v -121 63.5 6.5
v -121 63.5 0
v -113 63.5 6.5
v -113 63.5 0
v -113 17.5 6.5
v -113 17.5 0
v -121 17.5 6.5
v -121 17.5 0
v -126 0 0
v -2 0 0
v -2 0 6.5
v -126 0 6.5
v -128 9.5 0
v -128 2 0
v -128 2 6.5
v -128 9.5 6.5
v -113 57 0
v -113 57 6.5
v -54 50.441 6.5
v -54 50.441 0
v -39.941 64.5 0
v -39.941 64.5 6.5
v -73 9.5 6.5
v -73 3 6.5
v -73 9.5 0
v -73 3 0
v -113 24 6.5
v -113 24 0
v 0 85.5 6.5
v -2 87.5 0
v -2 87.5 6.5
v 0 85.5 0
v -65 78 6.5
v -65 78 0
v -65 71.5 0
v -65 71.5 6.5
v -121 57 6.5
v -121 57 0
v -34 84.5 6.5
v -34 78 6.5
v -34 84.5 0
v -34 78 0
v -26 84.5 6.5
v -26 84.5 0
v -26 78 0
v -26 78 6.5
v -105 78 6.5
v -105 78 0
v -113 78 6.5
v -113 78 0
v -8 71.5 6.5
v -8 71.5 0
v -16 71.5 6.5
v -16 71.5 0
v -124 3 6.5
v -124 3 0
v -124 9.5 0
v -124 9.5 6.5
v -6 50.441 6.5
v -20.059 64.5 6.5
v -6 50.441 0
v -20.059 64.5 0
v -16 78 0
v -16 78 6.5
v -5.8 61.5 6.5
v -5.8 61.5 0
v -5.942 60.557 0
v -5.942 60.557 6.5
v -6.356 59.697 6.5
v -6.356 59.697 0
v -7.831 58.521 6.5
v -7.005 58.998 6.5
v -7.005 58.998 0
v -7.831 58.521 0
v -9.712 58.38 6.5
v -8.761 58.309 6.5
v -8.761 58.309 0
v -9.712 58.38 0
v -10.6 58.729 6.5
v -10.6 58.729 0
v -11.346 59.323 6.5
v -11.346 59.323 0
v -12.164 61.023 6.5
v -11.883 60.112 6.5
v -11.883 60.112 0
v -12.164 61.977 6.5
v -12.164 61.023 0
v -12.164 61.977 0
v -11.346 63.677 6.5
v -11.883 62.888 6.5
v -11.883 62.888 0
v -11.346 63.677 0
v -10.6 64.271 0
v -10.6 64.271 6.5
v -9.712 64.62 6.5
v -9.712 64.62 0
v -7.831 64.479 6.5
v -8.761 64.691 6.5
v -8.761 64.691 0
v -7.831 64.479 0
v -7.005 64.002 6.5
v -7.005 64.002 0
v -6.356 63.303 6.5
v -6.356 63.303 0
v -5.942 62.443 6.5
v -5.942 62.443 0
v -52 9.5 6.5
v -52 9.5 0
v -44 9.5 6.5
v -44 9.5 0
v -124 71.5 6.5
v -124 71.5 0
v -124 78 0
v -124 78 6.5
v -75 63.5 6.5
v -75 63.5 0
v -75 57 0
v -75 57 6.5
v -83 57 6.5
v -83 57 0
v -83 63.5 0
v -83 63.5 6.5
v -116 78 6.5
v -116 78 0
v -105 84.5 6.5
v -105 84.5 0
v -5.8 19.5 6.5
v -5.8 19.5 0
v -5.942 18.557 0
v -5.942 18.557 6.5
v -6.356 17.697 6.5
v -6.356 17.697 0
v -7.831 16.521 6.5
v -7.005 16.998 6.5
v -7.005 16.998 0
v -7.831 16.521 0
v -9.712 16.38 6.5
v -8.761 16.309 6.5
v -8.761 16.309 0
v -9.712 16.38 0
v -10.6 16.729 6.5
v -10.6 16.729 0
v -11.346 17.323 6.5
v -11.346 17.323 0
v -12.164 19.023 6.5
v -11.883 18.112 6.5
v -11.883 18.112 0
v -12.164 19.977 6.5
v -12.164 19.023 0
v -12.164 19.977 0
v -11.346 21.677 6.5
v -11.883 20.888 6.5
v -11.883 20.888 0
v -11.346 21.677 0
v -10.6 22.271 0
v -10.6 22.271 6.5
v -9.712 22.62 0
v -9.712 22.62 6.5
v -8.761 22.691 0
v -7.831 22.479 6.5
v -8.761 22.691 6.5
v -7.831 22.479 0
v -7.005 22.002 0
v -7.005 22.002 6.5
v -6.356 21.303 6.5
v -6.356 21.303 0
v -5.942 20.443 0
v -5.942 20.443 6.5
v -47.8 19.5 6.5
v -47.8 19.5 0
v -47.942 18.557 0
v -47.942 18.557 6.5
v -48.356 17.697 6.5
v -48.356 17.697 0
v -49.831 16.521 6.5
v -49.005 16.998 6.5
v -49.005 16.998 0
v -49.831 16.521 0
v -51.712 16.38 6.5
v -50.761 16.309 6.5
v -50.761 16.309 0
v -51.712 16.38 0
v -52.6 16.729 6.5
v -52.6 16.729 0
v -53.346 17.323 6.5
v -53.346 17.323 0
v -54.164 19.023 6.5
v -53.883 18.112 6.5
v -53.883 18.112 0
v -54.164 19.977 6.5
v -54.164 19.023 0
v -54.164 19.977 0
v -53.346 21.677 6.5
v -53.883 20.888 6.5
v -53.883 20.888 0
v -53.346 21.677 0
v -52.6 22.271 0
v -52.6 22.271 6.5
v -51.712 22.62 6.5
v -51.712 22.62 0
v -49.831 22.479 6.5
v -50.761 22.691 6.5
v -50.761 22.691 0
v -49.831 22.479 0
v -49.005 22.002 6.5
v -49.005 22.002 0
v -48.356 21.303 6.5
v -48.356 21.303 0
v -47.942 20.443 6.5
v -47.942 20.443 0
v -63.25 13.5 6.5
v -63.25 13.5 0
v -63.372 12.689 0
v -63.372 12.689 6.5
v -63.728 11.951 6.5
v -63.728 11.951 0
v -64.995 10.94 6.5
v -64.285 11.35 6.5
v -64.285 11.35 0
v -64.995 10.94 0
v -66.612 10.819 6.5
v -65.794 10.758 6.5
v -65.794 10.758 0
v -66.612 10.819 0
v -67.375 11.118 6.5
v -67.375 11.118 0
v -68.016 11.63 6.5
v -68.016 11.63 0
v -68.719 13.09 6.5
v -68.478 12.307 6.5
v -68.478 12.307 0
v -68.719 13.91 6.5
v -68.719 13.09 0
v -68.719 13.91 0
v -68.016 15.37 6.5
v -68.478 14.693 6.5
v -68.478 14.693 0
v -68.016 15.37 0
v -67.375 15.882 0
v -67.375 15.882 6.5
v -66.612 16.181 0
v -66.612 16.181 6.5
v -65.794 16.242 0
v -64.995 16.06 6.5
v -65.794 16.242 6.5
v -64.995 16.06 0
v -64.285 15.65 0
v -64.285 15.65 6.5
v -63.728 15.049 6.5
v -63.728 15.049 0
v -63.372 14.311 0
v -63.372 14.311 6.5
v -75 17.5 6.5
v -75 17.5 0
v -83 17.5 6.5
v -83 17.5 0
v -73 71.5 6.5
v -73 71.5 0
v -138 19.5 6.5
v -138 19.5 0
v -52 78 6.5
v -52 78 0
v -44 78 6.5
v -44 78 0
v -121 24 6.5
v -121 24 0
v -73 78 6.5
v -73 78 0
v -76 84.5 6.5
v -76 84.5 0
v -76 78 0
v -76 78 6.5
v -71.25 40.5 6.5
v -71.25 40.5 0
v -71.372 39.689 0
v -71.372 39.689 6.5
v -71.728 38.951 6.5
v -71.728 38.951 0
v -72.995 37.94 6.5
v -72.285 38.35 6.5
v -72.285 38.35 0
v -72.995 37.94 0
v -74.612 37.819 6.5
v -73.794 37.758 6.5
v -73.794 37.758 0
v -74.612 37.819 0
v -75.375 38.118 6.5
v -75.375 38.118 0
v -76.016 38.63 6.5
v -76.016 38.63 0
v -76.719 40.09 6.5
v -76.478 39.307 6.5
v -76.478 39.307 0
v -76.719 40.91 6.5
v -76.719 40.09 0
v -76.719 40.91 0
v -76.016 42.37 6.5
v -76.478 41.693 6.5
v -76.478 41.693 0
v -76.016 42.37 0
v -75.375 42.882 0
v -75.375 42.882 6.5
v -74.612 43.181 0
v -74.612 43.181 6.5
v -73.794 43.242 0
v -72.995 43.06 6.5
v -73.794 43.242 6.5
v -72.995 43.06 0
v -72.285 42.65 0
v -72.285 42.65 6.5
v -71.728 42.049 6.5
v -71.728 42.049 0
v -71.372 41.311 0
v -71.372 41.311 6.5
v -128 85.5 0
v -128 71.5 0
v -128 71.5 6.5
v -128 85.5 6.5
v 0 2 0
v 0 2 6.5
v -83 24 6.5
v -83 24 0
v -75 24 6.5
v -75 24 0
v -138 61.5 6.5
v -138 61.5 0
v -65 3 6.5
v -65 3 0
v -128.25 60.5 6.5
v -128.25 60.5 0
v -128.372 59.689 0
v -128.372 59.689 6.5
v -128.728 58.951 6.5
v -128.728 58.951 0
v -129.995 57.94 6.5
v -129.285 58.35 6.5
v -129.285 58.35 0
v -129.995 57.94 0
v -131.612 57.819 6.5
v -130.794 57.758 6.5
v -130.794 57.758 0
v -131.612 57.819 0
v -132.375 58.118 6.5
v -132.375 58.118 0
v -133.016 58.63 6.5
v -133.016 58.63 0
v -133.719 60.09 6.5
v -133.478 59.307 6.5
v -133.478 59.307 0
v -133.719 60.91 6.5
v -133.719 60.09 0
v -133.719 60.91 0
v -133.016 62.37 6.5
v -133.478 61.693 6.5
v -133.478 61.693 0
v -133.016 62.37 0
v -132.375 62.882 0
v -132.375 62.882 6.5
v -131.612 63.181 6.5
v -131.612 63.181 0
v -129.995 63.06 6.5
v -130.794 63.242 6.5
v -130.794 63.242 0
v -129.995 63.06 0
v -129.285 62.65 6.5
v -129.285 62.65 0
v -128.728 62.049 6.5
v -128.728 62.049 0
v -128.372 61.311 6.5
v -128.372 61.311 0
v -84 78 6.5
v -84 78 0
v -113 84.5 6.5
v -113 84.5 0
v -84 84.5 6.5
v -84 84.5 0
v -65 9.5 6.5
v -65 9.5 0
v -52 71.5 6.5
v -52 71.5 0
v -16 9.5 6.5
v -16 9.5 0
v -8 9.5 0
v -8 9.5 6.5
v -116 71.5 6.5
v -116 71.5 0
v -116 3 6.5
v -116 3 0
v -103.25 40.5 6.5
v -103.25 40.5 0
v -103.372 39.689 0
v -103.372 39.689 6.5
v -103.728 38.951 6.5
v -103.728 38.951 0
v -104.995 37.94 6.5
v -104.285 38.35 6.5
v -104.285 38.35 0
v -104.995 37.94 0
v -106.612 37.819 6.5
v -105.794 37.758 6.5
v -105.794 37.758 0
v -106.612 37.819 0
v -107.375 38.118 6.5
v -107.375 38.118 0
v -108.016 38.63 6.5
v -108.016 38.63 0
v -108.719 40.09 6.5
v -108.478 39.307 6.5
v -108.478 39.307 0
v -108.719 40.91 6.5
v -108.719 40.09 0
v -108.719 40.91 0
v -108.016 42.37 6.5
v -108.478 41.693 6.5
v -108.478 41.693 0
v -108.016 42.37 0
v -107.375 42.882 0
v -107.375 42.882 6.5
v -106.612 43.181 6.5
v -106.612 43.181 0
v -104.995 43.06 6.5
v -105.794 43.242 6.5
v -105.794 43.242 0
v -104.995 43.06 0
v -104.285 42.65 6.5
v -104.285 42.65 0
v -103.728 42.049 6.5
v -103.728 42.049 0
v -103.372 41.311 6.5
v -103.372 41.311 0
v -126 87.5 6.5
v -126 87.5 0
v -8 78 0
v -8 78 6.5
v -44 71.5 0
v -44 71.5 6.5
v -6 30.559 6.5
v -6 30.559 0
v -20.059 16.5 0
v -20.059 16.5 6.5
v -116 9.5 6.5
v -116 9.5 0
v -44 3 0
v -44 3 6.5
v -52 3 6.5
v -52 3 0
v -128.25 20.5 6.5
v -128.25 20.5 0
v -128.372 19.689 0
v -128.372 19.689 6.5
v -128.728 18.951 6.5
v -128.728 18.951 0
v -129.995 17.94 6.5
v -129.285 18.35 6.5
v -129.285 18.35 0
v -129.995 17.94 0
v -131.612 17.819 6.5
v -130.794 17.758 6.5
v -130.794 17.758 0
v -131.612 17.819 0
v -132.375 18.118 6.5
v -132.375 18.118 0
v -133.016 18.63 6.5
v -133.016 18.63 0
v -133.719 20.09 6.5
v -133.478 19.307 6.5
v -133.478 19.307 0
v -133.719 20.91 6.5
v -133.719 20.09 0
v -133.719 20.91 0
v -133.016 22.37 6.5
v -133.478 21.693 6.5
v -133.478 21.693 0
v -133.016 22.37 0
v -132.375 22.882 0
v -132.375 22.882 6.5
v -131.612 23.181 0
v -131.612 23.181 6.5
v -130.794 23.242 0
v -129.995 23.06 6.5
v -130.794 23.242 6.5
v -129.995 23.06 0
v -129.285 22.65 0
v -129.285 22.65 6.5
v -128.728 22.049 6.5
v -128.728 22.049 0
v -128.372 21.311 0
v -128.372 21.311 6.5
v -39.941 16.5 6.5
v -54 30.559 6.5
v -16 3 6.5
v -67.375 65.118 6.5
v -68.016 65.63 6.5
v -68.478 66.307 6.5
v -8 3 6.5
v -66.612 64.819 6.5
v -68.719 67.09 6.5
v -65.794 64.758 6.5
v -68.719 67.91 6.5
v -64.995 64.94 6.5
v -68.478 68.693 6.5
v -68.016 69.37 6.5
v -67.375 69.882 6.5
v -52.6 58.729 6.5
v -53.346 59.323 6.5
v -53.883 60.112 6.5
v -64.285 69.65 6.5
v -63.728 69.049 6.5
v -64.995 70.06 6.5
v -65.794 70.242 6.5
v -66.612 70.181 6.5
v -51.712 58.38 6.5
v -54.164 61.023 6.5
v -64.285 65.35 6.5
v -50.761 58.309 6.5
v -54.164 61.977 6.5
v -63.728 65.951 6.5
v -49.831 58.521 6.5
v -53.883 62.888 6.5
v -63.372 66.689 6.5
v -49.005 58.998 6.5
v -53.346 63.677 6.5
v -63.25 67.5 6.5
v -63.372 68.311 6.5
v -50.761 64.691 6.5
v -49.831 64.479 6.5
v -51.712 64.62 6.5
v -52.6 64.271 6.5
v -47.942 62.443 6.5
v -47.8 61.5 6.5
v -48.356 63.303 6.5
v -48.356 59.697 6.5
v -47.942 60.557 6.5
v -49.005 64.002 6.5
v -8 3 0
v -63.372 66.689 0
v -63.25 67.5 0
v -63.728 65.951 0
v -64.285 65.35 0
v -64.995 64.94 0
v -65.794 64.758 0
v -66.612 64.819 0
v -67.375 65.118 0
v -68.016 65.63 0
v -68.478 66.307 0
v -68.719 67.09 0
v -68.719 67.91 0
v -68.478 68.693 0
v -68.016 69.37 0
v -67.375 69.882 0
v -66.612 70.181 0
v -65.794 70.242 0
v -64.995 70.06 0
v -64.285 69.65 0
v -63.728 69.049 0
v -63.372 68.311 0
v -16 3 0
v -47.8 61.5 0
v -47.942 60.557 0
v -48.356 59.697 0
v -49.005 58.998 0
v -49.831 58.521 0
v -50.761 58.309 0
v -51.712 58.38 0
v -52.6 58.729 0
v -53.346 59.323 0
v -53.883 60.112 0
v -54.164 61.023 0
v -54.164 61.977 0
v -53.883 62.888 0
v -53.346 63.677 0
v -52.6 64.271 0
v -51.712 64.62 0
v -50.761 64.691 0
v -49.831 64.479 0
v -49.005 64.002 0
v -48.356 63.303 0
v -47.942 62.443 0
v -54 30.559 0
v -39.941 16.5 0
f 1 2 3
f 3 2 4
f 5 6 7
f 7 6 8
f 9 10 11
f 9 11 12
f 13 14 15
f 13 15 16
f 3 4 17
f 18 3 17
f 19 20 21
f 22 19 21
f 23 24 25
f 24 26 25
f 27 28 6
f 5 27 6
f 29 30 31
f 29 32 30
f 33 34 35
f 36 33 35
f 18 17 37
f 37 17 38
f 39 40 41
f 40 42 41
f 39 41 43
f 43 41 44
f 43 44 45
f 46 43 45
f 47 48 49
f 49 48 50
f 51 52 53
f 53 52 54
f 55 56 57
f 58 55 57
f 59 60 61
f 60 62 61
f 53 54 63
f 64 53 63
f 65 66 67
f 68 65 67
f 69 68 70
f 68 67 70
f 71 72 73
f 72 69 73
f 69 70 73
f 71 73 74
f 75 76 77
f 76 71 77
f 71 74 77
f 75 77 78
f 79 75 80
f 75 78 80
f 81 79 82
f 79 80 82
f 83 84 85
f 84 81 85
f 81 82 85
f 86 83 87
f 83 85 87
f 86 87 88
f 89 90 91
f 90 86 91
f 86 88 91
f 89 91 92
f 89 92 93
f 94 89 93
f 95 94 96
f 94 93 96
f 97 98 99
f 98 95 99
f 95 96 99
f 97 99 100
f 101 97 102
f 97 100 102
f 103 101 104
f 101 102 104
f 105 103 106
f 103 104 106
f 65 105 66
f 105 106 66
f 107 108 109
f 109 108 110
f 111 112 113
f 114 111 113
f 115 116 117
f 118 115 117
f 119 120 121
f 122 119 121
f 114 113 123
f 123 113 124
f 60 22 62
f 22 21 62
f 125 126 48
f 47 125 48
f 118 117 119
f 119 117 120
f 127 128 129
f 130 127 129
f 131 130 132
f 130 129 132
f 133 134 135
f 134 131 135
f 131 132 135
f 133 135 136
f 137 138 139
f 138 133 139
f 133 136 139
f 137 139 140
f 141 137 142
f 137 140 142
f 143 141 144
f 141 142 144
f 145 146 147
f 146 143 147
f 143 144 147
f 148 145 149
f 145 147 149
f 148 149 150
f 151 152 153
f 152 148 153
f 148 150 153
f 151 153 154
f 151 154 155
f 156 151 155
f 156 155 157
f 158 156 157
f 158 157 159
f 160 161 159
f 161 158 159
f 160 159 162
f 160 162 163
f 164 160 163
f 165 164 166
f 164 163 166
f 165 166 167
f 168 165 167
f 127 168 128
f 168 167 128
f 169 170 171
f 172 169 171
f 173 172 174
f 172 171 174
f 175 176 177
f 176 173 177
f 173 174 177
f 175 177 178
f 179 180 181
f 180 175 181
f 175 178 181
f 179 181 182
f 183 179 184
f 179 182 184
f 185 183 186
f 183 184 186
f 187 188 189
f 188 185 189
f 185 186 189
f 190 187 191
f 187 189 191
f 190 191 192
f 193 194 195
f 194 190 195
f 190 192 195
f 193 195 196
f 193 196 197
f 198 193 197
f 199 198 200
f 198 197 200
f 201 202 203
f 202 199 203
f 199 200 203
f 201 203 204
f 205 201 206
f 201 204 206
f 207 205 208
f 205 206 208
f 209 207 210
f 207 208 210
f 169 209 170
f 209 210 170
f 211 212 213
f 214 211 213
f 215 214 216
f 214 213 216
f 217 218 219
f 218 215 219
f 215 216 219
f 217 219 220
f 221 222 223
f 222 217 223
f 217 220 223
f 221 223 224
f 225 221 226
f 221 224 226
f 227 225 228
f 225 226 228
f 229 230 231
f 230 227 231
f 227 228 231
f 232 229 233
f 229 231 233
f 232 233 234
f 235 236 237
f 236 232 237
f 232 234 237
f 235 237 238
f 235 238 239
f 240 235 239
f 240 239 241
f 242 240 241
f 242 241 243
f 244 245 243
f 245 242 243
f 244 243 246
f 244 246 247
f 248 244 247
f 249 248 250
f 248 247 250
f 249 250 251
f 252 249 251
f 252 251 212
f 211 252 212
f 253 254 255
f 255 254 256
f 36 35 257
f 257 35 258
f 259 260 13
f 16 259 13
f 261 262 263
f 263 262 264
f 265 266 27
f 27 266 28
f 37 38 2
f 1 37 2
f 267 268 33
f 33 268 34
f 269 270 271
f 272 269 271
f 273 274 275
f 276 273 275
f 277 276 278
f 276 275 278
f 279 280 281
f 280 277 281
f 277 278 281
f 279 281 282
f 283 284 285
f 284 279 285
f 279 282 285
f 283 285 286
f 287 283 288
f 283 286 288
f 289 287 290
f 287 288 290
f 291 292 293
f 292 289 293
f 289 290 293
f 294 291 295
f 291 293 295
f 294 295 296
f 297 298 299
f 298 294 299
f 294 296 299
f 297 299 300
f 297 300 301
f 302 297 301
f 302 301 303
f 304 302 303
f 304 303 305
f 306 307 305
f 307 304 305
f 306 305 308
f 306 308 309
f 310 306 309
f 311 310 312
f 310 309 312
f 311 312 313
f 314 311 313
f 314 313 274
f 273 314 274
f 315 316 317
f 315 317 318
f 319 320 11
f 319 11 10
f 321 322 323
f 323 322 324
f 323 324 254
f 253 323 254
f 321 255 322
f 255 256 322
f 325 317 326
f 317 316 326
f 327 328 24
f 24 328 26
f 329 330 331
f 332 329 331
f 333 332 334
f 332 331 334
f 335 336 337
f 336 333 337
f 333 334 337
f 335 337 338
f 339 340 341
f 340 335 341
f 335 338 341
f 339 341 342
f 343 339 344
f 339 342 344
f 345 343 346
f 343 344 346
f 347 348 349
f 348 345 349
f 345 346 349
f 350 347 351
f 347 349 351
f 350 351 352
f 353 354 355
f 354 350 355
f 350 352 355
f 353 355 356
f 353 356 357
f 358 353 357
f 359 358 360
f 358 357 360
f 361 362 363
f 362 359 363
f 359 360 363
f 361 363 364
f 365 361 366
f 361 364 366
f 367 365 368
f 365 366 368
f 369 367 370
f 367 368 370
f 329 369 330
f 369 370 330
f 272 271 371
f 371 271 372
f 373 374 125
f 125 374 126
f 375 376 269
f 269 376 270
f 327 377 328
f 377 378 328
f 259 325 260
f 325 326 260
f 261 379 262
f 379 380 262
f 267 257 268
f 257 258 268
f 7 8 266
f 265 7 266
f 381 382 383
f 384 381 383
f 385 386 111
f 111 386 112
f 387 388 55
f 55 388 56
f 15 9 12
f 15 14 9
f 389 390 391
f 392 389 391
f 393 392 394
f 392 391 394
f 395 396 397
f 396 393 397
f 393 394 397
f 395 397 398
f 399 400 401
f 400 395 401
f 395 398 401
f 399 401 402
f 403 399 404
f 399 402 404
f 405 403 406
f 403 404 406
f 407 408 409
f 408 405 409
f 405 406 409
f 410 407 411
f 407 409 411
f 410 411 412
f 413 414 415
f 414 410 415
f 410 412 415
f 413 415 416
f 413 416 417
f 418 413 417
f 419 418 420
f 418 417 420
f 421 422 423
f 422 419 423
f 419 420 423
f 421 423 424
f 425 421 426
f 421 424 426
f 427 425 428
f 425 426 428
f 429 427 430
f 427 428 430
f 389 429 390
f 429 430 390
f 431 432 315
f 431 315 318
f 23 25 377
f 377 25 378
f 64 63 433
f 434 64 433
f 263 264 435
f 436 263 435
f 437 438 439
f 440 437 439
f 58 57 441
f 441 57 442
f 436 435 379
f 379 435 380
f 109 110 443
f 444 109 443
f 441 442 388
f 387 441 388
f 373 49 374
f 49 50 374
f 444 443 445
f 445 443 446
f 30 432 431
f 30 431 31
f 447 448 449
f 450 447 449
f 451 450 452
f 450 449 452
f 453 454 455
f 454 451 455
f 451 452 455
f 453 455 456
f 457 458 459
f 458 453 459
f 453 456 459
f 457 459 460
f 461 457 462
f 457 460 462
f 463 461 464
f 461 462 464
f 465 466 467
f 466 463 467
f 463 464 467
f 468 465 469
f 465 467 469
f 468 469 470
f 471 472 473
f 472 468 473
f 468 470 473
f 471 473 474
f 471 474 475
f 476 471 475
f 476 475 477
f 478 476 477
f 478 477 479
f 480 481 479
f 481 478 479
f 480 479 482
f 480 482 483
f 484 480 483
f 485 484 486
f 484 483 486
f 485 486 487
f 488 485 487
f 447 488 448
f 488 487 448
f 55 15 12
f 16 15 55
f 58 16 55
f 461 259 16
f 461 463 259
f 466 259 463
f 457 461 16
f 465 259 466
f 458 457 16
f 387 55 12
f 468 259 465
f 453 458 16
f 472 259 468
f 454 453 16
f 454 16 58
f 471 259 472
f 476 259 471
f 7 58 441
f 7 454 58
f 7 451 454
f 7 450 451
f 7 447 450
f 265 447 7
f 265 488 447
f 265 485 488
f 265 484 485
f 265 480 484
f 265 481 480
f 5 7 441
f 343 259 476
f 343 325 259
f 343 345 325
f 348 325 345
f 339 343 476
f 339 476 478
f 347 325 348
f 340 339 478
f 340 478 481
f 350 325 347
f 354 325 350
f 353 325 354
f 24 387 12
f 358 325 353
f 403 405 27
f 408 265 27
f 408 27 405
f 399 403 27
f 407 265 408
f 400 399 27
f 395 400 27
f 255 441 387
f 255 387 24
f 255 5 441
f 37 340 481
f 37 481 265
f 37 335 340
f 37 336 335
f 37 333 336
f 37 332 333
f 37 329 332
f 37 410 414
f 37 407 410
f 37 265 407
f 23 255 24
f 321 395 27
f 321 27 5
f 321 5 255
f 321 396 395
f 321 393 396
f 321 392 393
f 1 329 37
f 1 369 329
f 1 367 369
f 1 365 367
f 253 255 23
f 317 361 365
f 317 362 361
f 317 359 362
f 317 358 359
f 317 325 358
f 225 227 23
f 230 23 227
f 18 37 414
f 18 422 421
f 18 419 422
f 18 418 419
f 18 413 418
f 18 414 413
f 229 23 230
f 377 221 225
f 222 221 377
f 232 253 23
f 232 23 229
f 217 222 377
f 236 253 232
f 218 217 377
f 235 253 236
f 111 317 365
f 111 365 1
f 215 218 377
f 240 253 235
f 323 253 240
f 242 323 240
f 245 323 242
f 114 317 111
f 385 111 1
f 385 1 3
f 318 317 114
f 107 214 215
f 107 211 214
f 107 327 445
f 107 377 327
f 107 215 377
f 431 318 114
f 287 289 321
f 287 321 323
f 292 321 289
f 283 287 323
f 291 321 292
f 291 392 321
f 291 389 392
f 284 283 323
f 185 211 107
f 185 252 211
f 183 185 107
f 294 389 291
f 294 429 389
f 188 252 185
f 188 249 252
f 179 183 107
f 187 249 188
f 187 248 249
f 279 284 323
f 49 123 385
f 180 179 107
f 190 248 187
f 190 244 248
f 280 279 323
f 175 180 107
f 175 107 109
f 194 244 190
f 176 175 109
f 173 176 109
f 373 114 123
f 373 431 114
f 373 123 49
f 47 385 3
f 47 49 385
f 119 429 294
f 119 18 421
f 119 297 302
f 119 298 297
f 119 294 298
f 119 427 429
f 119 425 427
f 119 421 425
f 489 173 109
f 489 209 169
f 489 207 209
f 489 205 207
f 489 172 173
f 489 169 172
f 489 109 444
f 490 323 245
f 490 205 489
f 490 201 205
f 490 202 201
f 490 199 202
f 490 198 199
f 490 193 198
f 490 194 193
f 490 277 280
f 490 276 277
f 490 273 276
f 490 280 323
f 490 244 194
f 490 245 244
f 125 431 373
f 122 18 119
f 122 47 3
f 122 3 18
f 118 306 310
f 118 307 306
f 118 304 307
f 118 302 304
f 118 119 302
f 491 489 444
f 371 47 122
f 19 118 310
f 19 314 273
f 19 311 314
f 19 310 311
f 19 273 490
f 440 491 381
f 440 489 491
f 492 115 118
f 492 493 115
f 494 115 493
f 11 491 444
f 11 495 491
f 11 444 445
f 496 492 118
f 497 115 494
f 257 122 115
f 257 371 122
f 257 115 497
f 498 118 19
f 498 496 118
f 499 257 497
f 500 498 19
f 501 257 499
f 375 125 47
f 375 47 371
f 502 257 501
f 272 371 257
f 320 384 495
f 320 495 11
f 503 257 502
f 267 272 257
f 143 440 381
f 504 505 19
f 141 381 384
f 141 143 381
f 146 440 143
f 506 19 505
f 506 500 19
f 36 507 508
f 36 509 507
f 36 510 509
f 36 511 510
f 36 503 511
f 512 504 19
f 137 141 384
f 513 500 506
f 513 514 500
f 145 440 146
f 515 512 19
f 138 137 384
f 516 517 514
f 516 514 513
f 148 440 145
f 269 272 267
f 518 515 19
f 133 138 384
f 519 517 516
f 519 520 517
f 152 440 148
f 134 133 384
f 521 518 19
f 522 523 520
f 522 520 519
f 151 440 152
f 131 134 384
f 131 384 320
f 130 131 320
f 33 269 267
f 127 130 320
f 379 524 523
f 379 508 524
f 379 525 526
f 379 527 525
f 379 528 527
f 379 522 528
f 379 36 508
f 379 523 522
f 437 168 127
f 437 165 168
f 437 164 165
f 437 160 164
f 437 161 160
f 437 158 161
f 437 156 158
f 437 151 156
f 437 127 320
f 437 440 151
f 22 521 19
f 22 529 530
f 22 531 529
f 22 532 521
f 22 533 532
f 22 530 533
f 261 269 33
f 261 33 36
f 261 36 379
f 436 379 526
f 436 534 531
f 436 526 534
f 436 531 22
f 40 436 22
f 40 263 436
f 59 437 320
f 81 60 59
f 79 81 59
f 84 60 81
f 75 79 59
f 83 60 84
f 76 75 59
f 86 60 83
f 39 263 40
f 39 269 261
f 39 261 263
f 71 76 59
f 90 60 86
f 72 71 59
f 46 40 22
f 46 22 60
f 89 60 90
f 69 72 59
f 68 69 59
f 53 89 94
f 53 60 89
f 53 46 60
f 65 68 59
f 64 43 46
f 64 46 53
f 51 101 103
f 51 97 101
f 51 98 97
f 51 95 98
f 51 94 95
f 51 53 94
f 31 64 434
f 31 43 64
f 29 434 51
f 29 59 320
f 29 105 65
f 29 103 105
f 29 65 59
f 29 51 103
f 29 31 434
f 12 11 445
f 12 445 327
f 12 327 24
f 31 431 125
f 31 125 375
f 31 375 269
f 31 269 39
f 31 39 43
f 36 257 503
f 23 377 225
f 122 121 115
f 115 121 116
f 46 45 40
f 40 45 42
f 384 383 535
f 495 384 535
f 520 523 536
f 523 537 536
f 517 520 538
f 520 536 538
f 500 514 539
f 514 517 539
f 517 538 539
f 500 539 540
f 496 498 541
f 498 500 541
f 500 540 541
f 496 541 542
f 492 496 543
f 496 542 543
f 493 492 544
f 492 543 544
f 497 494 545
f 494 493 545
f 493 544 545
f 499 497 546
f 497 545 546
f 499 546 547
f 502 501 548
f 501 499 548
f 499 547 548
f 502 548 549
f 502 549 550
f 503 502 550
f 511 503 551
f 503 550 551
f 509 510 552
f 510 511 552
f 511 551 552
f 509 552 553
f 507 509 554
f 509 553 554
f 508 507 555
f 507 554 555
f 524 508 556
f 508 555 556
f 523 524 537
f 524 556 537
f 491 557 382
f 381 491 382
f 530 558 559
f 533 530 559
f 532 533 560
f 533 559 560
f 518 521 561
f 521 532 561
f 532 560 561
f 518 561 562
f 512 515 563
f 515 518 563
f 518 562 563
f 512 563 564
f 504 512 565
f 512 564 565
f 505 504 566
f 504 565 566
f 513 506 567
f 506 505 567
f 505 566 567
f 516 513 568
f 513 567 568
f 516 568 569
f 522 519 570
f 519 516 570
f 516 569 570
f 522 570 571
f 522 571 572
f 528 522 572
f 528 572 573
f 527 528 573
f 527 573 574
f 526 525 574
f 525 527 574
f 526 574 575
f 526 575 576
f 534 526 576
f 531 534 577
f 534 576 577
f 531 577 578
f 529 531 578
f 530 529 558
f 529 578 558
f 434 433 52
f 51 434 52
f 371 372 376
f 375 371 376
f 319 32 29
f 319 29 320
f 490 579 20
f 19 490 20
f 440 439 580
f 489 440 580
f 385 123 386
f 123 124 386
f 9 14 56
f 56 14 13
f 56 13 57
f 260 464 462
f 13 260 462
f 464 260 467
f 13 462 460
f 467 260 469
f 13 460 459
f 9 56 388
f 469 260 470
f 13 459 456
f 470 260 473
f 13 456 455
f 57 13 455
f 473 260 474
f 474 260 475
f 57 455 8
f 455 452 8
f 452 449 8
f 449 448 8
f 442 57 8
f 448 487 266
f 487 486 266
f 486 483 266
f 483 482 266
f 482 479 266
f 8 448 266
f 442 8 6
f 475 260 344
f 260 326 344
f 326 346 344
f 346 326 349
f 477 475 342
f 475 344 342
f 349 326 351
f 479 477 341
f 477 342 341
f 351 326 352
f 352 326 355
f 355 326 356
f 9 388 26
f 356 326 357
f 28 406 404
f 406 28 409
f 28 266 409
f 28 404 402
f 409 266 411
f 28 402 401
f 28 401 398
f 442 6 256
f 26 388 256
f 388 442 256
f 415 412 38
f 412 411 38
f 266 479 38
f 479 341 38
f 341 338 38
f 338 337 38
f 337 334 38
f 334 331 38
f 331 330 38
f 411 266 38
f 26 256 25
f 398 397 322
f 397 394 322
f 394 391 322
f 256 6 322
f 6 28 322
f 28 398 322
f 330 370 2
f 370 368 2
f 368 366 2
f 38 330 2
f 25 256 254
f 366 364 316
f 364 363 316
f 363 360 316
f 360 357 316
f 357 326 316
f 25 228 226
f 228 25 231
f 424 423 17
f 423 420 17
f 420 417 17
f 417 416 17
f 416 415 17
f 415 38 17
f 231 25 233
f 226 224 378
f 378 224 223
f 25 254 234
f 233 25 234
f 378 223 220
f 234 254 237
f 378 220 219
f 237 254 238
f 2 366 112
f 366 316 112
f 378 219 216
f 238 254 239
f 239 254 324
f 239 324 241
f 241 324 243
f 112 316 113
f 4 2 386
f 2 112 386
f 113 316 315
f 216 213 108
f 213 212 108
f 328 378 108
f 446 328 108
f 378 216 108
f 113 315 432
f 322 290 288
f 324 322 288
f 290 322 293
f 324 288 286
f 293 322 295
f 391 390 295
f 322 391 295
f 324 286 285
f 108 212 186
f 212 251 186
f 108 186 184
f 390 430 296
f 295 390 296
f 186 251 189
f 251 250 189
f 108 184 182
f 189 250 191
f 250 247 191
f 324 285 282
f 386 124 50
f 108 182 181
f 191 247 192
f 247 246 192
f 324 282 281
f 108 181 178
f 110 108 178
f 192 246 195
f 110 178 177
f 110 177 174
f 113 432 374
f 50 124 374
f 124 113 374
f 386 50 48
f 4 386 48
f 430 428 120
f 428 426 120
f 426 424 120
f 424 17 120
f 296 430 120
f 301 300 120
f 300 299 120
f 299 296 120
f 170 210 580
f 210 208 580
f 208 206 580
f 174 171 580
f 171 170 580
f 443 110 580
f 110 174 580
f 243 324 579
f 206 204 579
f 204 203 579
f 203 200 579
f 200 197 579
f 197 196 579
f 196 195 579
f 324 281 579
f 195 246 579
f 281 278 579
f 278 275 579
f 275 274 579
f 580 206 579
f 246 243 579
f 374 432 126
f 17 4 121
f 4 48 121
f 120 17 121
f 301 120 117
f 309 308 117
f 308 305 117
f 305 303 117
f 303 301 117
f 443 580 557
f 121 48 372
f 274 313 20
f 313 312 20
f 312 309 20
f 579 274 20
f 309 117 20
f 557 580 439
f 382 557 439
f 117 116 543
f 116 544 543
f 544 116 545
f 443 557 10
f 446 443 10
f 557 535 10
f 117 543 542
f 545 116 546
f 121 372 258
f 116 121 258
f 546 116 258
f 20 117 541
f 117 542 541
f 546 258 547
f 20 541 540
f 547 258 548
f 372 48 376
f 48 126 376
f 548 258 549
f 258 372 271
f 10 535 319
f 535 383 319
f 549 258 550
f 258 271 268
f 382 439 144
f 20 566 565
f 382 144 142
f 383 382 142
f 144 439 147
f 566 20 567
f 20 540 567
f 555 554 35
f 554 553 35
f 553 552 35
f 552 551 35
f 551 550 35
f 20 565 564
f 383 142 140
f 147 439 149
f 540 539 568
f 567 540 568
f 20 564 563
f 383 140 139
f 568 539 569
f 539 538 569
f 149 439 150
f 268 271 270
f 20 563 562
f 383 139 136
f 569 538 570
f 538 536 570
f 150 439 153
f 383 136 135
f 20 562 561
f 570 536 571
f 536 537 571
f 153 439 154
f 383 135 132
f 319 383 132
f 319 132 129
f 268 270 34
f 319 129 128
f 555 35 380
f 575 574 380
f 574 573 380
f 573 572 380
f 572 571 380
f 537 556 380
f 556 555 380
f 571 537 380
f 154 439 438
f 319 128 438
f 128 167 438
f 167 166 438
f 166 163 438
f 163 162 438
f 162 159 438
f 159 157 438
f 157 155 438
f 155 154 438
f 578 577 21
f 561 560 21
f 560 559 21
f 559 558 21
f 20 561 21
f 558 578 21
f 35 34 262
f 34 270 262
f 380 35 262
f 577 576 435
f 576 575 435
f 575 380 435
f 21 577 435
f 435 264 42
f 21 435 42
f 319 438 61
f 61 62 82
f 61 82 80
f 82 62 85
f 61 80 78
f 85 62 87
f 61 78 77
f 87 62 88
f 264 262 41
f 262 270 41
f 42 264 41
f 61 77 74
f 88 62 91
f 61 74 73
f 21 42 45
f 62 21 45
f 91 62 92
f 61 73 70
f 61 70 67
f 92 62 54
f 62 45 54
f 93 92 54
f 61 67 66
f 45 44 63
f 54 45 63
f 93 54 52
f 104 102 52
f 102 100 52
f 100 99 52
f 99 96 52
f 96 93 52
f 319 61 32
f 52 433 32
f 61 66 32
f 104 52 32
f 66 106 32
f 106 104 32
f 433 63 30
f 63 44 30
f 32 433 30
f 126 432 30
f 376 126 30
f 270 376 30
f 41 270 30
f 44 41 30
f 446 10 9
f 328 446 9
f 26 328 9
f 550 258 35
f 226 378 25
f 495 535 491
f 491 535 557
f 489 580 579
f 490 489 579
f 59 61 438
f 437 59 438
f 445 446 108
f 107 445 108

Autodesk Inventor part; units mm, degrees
ref_plane "YZ Plane" through (0, 0, 0) normal (1, 0, 0) x (0, 1, 0)
ref_plane "XZ Plane" through (0, 0, 0) normal (0, 1, 0) x (-1, 0, 0)
ref_plane "XY Plane" through (0, 0, 0) normal (0, 0, 1) x (1, 0, 0)
sketch "Sketch1" plane through (0, 0, 0) normal (0, 0, 1) x (1, 0, 0)
  line L0 (0, 0) -> (-128, 0)
  line L1 (-128, 87.5) -> (0, 87.5)
  line L2 (0, 87.5) -> (0, 0)
  line L3 (-128, 71.5) -> (-138, 61.5)
  line L4 (-138, 61.5) -> (-138, 19.5)
  line L5 (-138, 19.5) -> (-128, 9.5)
  line L6 (-128, 0) -> (-128, 9.5)
  line L7 (-128, 71.5) -> (-128, 87.5)
  line L8 (-52, 9.5) -> (-44, 9.5)
  line L9 (-44, 9.5) -> (-44, 3)
  line L10 (-44, 3) -> (-52, 3)
  line L11 (-52, 3) -> (-52, 9.5)
  line L12 (-52, 78) -> (-44, 78)
  line L13 (-44, 78) -> (-44, 71.5)
  line L14 (-44, 71.5) -> (-52, 71.5)
  line L15 (-52, 71.5) -> (-52, 78)
  line L16 (-16, 78) -> (-8, 78)
  line L17 (-8, 78) -> (-8, 71.5)
  line L18 (-8, 71.5) -> (-16, 71.5)
  line L19 (-16, 71.5) -> (-16, 78)
  line L20 (-16, 9.5) -> (-8, 9.5)
  line L21 (-8, 9.5) -> (-8, 3)
  line L22 (-8, 3) -> (-16, 3)
  line L23 (-16, 3) -> (-16, 9.5)
  line L24 (-34, 84.5) -> (-26, 84.5)
  line L25 (-26, 84.5) -> (-26, 78)
  line L26 (-26, 78) -> (-34, 78)
  line L27 (-34, 78) -> (-34, 84.5)
  line L28 (-6, 50.4411) -> (-6, 30.5589)
  line L29 (-6, 30.5589) -> (-20.0589, 16.5)
  line L30 (-20.0589, 16.5) -> (-39.9411, 16.5)
  line L31 (-39.9411, 16.5) -> (-54, 30.5589)
  line L32 (-54, 30.5589) -> (-54, 50.4411)
  line L33 (-54, 50.4411) -> (-39.9411, 64.5)
  line L34 (-39.9411, 64.5) -> (-20.0589, 64.5)
  line L35 (-20.0589, 64.5) -> (-6, 50.4411)
  line L36 (-51, 61.5) -> (-9, 61.5) construction
  line L37 (-9, 61.5) -> (-9, 19.5) construction
  line L38 (-9, 19.5) -> (-51, 19.5) construction
  line L39 (-51, 19.5) -> (-51, 61.5) construction
  circle A0 centre (-51, 61.5) radius 3.2
  circle A1 centre (-51, 19.5) radius 3.2
  circle A2 centre (-9, 19.5) radius 3.2
  circle A3 centre (-9, 61.5) radius 3.2
  circle A4 centre (-131, 60.5) radius 2.75
  circle A5 centre (-131, 20.5) radius 2.75
  line L40 (-124, 78) -> (-116, 78)
  line L41 (-116, 78) -> (-116, 71.5)
  line L42 (-116, 71.5) -> (-124, 71.5)
  line L43 (-124, 71.5) -> (-124, 78)
  line L44 (-124, 9.5) -> (-116, 9.5)
  line L45 (-116, 9.5) -> (-116, 3)
  line L46 (-116, 3) -> (-124, 3)
  line L47 (-124, 3) -> (-124, 9.5)
  line L48 (-121, 63.5) -> (-113, 63.5)
  line L49 (-113, 63.5) -> (-113, 57)
  line L50 (-113, 57) -> (-121, 57)
  line L51 (-121, 57) -> (-121, 63.5)
  line L52 (-121, 24) -> (-113, 24)
  line L53 (-113, 24) -> (-113, 17.5)
  line L54 (-113, 17.5) -> (-121, 17.5)
  line L55 (-121, 17.5) -> (-121, 24)
  circle A6 centre (-66, 67.5) radius 2.75
  circle A7 centre (-66, 13.5) radius 2.75
  line L56 (-60, 87.5) -> (-60, 0) construction
  line L57 (-132, 67.5) -> (-60, 67.5) construction
  line L58 (-132, 13.5) -> (-60, 13.5) construction
  line L59 (-83, 63.5) -> (-75, 63.5)
  line L60 (-75, 63.5) -> (-75, 57)
  line L61 (-75, 57) -> (-83, 57)
  line L62 (-83, 57) -> (-83, 63.5)
  line L63 (-83, 24) -> (-75, 24)
  line L64 (-75, 24) -> (-75, 17.5)
  line L65 (-75, 17.5) -> (-83, 17.5)
  line L66 (-83, 17.5) -> (-83, 24)
  line L67 (-73, 78) -> (-65, 78)
  line L68 (-65, 78) -> (-65, 71.5)
  line L69 (-65, 71.5) -> (-73, 71.5)
  line L70 (-73, 71.5) -> (-73, 78)
  line L71 (-73, 9.5) -> (-65, 9.5)
  line L72 (-65, 9.5) -> (-65, 3)
  line L73 (-65, 3) -> (-73, 3)
  line L74 (-73, 3) -> (-73, 9.5)
  line L75 (-113, 84.5) -> (-105, 84.5)
  line L76 (-105, 84.5) -> (-105, 78)
  line L77 (-105, 78) -> (-113, 78)
  line L78 (-113, 78) -> (-113, 84.5)
  line L79 (-84, 84.5) -> (-76, 84.5)
  line L80 (-76, 84.5) -> (-76, 78)
  line L81 (-76, 78) -> (-84, 78)
  line L82 (-84, 78) -> (-84, 84.5)
  circle A8 centre (-106, 40.5) radius 2.75
  circle A9 centre (-74, 40.5) radius 2.75
  point P0 (-30, 40.5)
  point P1 (-138, 40.5)
  point P2 (-54, 40.5)
  point P3 (-51, 40.5)
  point P4 (-30, 61.5)
  point P5 (-30, 64.5)
  dimension "d1" = 45
  dimension "d2" = 10
  dimension "d5" = 3
  dimension "d6" = 8
  dimension "d7" = 8
  dimension "d8" = 6.5
  dimension "d10" = 3
  dimension "d11" = 48
  dimension "d12" = 8
  dimension "d13" = 6
  dimension "d14" = 42
  dimension "d15" = 42
  dimension "d16" = 6.4
  dimension "d17" = 6.4
  dimension "d18" = 6.4
  dimension "d19" = 6.4
  dimension "d20" = 5.5
  dimension "d21" = 5.5
  dimension "d22" = 7
  dimension "d23" = 11
  dimension "d24" = 11
  dimension "d25" = 6.5
  dimension "d26" = 8
  dimension "d27" = 6.5
  dimension "d28" = 6.5
  dimension "d29" = 8
  dimension "d30" = 6.5
  dimension "d31" = 8
  dimension "d32" = 8
  dimension "d33" = 5.5
  dimension "d34" = 5.5
  dimension "d35" = 4
  dimension "d36" = 4
  dimension "d37" = 8
  dimension "d38" = 8
  dimension "d39" = 8
  dimension "d40" = 4
  dimension "d41" = 8
  dimension "d42" = 128
  dimension "d43" = 68
  dimension "d44" = 8
  dimension "d45" = 43
  dimension "d47" = 10
  dimension "d48" = 15
  dimension "d49" = 62
  dimension "d50" = 10
  dimension "d52" = 8
  dimension "d53" = 3
  dimension "d54" = 8
  dimension "d55" = 3
  dimension "d56" = 5.5
  dimension "d57" = 5.5
  dimension "d58" = 14
  dimension "d59" = 32
  dimension "d66" = 54
extrude "Extrusion1" add sketch "Sketch1" along normal blind 6.5
chamfer "Chamfer1" distance 2 angle 45 4 edges at (-128, 0, 3.25) (-128, 87.5, 3.25) (0, 87.5, 3.25) (0, 0, 3.25)
properties part number "x_iddler_bottom" material "Plywood, Finish"
